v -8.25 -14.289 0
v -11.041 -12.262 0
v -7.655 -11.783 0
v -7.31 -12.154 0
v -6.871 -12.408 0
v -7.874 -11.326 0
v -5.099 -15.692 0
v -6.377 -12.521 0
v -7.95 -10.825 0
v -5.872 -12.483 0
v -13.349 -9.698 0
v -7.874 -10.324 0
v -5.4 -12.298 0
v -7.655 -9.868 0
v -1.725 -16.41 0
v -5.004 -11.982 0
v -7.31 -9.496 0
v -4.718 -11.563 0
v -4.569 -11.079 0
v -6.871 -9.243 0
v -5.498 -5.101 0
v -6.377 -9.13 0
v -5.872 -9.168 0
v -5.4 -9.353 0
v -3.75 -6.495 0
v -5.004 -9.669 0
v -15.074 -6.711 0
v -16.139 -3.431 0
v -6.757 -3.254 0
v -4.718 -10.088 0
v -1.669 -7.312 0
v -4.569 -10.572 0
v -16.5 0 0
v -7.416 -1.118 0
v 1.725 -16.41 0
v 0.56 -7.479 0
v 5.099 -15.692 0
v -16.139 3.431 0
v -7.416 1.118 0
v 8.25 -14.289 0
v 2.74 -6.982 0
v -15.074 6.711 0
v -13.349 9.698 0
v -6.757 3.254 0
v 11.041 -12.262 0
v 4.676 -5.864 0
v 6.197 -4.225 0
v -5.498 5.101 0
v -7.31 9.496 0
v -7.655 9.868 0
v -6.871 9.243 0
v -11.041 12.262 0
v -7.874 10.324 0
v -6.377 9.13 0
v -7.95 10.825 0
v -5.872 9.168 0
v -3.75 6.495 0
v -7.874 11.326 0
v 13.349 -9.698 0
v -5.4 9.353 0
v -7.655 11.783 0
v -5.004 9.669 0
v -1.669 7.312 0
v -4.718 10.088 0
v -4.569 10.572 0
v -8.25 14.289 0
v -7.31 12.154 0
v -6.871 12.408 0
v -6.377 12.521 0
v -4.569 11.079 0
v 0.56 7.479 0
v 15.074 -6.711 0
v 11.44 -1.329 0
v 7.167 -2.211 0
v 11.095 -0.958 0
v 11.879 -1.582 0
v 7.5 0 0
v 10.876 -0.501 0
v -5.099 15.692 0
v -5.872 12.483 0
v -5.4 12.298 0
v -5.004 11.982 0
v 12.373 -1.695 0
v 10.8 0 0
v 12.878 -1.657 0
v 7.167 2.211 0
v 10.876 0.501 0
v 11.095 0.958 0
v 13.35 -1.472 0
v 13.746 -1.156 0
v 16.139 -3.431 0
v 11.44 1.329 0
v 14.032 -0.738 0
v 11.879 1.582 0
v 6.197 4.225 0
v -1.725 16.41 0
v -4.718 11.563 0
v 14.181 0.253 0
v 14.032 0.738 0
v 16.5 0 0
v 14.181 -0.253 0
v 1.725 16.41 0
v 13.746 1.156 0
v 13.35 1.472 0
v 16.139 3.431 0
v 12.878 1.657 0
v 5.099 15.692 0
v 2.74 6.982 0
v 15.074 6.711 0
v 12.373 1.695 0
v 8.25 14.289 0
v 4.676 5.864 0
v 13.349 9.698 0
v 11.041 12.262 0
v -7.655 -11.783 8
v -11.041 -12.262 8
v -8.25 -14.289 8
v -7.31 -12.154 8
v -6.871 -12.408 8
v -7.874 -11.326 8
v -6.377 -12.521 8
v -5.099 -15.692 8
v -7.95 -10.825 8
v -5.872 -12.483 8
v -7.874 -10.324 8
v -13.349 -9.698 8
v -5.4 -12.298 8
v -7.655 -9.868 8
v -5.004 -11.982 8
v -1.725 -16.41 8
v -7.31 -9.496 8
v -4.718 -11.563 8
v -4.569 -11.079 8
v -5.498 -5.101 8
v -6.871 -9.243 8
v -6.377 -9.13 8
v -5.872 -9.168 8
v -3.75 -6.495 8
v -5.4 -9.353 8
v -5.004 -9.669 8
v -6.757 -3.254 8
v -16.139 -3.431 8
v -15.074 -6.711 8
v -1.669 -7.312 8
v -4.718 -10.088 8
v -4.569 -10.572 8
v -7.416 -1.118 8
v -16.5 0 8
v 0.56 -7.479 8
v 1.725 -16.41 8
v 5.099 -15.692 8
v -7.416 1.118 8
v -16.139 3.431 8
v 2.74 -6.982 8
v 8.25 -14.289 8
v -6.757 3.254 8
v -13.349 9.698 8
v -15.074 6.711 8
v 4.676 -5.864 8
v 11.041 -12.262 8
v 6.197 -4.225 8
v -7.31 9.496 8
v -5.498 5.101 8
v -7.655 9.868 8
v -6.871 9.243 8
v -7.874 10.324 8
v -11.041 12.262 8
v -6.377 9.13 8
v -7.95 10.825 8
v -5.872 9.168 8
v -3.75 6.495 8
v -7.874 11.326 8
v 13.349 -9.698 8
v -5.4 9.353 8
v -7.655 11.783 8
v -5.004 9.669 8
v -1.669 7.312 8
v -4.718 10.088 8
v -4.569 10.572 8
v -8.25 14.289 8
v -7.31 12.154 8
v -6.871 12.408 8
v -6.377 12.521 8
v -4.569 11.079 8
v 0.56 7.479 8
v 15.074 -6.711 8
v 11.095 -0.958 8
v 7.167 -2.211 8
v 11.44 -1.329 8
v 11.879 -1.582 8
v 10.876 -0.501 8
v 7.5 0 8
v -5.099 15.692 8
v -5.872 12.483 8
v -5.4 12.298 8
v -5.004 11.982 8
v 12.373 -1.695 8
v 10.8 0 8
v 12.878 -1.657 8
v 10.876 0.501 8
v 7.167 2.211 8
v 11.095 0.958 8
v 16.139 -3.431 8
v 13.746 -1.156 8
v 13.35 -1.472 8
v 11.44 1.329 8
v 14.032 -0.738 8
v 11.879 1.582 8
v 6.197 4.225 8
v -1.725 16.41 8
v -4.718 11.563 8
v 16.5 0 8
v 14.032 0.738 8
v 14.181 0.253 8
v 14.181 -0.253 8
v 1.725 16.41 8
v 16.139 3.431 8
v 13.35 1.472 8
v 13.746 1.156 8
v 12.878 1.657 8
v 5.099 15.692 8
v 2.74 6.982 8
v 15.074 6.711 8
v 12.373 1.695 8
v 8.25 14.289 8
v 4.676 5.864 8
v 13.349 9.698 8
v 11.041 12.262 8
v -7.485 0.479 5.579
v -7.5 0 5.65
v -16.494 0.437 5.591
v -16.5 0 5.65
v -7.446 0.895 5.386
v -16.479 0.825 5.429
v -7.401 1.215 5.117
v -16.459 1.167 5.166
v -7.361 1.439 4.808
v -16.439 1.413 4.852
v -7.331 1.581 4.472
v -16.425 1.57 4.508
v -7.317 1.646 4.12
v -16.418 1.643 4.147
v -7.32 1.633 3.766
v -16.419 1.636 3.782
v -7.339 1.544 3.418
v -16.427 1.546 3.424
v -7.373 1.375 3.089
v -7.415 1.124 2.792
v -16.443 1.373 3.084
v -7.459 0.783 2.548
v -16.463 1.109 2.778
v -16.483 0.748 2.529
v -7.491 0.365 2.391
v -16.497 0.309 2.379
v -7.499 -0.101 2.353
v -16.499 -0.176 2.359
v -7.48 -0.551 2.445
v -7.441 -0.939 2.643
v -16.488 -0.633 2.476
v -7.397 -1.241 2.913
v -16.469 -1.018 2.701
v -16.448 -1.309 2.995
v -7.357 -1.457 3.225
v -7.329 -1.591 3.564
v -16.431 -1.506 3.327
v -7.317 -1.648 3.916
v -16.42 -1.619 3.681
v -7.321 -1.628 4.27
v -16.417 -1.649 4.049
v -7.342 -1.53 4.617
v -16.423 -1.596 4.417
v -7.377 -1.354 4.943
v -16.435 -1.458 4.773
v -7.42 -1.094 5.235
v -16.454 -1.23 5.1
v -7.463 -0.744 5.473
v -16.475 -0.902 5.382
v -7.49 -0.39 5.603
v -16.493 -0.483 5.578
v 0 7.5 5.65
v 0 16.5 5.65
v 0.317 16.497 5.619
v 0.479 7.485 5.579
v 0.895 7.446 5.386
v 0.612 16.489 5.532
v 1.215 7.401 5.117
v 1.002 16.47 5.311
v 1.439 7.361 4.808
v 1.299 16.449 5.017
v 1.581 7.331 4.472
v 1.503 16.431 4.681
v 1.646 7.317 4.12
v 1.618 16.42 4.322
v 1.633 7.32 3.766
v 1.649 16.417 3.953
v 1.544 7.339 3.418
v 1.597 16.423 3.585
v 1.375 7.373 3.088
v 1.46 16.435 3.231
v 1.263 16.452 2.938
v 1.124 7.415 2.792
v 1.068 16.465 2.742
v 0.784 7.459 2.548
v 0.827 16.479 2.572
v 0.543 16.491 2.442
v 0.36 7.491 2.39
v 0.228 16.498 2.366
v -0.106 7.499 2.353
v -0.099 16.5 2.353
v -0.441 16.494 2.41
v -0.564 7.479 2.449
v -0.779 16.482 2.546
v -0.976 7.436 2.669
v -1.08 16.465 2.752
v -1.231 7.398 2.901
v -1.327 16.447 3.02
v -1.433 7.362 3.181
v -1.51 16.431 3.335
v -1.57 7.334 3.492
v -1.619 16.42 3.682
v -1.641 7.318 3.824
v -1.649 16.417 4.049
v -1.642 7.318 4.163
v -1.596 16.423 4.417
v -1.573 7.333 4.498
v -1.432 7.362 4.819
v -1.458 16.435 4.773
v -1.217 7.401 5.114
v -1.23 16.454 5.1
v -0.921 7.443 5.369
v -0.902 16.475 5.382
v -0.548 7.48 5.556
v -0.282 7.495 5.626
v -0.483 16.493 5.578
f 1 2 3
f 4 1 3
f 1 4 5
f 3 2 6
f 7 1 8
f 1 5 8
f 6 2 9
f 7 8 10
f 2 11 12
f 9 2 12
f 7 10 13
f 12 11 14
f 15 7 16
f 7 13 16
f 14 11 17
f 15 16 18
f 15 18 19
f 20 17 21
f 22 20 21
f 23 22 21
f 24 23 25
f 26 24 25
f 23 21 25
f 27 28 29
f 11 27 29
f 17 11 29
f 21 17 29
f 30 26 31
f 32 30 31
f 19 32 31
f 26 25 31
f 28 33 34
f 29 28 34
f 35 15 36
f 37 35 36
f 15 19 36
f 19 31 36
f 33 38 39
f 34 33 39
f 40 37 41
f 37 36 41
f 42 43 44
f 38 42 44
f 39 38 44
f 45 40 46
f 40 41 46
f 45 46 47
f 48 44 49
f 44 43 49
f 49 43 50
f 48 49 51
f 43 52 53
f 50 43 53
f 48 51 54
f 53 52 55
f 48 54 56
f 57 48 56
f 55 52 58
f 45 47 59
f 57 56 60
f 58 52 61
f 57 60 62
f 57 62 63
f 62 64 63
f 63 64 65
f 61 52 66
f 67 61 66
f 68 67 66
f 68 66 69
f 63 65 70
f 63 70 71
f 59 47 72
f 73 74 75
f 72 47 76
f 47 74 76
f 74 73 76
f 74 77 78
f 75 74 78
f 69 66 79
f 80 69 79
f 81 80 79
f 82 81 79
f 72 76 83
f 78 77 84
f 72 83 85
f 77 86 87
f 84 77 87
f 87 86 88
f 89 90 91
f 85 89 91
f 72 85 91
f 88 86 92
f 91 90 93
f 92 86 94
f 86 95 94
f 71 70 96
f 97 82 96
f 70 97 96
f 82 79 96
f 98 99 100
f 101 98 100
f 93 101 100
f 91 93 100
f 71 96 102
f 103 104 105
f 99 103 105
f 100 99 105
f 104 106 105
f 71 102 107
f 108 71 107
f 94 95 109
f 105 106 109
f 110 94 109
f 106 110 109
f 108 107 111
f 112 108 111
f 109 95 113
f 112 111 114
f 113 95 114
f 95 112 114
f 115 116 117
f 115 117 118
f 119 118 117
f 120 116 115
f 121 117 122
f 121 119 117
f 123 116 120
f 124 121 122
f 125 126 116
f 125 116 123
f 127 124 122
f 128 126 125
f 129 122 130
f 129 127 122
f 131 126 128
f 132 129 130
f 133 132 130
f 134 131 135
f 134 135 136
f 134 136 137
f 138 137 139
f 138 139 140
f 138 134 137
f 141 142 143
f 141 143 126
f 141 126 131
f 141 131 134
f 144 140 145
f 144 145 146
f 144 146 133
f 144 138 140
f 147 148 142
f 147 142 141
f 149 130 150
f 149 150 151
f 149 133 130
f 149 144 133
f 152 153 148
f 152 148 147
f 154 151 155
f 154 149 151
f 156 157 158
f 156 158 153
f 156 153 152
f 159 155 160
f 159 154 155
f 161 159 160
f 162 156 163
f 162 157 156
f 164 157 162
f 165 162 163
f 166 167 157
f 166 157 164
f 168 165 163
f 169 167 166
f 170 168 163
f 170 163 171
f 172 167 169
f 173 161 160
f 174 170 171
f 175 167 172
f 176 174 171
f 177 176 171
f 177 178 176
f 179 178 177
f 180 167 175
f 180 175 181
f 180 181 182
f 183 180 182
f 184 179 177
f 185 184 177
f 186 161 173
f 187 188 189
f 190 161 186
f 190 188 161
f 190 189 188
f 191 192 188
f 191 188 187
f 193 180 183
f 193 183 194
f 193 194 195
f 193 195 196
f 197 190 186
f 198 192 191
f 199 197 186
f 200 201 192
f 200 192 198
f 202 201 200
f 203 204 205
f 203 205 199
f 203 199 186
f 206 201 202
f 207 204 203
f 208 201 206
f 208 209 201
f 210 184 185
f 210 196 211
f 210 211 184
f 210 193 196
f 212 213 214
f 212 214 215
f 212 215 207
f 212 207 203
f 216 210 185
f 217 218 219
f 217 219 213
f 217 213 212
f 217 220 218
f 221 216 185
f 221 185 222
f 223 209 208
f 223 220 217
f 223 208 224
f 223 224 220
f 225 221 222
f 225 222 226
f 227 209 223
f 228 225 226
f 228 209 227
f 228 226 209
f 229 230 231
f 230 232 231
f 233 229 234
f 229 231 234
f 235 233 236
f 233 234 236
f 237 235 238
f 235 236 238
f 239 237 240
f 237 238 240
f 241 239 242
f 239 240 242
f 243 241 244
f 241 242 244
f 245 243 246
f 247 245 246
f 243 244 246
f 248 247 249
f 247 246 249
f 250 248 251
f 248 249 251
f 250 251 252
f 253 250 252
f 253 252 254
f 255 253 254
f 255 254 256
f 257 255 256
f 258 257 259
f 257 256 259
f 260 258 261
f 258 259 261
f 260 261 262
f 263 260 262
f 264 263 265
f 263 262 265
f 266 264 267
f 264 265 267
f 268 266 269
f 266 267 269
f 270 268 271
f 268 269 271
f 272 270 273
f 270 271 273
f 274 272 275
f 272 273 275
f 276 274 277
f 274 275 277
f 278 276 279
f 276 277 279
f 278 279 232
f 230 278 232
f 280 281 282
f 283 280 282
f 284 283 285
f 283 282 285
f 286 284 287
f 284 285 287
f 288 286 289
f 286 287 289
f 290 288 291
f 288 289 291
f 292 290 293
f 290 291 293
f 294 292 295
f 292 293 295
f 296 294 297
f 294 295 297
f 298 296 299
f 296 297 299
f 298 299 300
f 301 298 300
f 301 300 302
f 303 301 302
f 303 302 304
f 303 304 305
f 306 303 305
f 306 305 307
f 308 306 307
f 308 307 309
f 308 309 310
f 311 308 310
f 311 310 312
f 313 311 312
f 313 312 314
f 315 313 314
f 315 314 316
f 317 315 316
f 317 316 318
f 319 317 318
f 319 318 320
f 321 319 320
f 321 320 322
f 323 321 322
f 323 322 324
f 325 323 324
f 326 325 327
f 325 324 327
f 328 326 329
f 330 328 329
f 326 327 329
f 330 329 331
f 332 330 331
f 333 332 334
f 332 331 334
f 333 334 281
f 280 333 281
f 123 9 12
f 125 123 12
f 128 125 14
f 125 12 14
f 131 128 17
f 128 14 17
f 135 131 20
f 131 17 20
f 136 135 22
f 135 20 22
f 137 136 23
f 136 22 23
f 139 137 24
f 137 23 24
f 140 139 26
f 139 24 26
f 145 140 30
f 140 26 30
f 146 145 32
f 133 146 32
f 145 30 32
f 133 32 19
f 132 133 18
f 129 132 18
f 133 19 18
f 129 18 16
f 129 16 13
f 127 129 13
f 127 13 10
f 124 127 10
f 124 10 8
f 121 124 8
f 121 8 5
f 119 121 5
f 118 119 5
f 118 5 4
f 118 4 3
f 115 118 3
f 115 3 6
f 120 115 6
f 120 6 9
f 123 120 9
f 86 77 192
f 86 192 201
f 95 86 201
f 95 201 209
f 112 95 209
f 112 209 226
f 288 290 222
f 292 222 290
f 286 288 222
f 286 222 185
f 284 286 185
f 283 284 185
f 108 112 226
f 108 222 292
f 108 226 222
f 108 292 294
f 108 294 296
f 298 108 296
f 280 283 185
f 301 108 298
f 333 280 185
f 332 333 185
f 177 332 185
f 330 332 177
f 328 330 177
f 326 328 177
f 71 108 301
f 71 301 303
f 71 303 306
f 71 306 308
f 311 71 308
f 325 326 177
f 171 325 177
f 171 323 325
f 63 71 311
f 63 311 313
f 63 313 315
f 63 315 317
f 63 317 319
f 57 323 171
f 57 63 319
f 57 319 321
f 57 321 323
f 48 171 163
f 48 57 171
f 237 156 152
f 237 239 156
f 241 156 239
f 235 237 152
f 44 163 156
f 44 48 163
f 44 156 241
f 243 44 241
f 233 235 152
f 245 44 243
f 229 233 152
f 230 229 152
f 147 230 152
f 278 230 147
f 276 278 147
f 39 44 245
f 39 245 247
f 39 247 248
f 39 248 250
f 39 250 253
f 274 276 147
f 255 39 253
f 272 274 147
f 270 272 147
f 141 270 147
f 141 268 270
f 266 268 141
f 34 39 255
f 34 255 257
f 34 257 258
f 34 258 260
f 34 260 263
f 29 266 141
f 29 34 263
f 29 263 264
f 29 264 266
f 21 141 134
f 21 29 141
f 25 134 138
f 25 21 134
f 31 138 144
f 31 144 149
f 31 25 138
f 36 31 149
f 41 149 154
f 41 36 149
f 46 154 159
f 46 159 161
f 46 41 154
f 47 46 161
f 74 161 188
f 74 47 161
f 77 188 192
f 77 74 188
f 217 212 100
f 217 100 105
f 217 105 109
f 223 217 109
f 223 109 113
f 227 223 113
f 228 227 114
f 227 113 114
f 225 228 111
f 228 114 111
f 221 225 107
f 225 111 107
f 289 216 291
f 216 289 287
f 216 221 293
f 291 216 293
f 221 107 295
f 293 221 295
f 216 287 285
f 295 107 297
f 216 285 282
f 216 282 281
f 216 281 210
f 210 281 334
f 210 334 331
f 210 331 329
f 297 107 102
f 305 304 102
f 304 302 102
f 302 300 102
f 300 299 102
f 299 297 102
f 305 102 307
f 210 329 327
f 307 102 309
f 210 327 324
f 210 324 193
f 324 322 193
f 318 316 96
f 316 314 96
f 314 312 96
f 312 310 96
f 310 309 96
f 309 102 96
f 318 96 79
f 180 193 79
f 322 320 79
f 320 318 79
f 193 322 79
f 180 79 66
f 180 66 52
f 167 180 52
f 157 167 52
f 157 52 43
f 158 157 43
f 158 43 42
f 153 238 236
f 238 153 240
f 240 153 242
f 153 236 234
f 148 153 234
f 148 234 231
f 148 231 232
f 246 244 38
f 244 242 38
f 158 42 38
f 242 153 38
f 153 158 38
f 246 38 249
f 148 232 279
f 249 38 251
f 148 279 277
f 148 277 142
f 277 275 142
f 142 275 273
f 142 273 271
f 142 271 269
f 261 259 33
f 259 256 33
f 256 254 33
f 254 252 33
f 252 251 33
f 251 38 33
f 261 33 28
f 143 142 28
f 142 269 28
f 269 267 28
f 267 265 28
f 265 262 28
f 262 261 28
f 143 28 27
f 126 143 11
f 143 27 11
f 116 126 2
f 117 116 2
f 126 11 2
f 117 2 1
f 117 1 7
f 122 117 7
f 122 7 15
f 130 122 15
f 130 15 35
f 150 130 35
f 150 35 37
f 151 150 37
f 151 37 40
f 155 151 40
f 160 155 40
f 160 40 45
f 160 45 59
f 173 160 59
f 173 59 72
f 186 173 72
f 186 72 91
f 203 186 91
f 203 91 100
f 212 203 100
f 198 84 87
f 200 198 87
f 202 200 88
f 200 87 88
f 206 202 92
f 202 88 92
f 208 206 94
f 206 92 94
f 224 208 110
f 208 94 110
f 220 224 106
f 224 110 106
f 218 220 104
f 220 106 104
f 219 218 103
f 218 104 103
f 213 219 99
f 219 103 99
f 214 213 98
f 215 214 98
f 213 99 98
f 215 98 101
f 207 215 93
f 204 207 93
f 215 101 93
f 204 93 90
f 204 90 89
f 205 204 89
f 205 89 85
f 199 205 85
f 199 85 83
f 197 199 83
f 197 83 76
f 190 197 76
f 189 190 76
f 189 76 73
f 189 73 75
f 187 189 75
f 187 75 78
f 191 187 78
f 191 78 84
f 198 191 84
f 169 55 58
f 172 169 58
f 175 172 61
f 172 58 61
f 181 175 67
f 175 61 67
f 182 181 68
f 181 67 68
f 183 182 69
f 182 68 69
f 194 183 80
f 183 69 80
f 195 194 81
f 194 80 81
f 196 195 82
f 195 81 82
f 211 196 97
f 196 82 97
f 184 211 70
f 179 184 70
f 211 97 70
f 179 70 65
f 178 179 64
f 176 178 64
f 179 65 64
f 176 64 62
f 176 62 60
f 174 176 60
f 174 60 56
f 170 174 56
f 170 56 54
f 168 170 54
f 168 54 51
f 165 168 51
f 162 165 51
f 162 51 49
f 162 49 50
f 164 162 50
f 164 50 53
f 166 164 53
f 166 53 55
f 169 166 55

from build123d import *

# Parameters (mm, degrees)
SKETCH_1_R        = 16.5
SKETCH_1_R_2      = 7.5
EXTRUDE_1_DEPTH   = 8
HOLE_WIZARD_M31_D = 3.4
M4X0_71_REACH     = 39.752
M4X0_71_BORE_R    = 1.65
M4X0_72_REACH     = 39.752
M4X0_72_BORE_R    = 1.65


with BuildPart() as part:
    # Эскиз1 → Бобышка-Вытянуть1 (new body)
    with BuildSketch(Plane.XY):
        Circle(SKETCH_1_R)
        Circle(SKETCH_1_R_2, mode=Mode.SUBTRACT)
    extrude(amount=EXTRUDE_1_DEPTH)

    # Отверстие с зазором M31 (through all)
    with Locations(Plane.XY.offset(8)):
        with Locations((-6.25, 10.825317547), (12.5, 0), (-6.25, -10.825317547)):
            Hole(HOLE_WIZARD_M31_D / 2)

    # Отверстие обработанное метчиком M4x0.71 bore → Отверстие обработанное метчиком M4x0.71 (cut, up to next)
    with BuildSketch(Plane.ZY.offset(16.5), mode=Mode.PRIVATE) as m4x0_71_sk1:
        with Locations((4, 0)):
            Circle(M4X0_71_BORE_R)
    m4x0_71_tool1 = extrude(m4x0_71_sk1.sketch, amount=-M4X0_71_REACH, mode=Mode.PRIVATE) & part.part
    add(m4x0_71_tool1.solids().sort_by_distance((-16.5, 0, 4))[0], mode=Mode.SUBTRACT)

    # Отверстие обработанное метчиком M4x0.72 bore → Отверстие обработанное метчиком M4x0.72 (cut, up to next)
    with BuildSketch(Plane.ZX.offset(16.5), mode=Mode.PRIVATE) as m4x0_72_sk1:
        with Locations((4, 0)):
            Circle(M4X0_72_BORE_R)
    m4x0_72_tool1 = extrude(m4x0_72_sk1.sketch, amount=-M4X0_72_REACH, mode=Mode.PRIVATE) & part.part
    add(m4x0_72_tool1.solids().sort_by_distance((0, 16.5, 4))[0], mode=Mode.SUBTRACT)


solid = part.part
